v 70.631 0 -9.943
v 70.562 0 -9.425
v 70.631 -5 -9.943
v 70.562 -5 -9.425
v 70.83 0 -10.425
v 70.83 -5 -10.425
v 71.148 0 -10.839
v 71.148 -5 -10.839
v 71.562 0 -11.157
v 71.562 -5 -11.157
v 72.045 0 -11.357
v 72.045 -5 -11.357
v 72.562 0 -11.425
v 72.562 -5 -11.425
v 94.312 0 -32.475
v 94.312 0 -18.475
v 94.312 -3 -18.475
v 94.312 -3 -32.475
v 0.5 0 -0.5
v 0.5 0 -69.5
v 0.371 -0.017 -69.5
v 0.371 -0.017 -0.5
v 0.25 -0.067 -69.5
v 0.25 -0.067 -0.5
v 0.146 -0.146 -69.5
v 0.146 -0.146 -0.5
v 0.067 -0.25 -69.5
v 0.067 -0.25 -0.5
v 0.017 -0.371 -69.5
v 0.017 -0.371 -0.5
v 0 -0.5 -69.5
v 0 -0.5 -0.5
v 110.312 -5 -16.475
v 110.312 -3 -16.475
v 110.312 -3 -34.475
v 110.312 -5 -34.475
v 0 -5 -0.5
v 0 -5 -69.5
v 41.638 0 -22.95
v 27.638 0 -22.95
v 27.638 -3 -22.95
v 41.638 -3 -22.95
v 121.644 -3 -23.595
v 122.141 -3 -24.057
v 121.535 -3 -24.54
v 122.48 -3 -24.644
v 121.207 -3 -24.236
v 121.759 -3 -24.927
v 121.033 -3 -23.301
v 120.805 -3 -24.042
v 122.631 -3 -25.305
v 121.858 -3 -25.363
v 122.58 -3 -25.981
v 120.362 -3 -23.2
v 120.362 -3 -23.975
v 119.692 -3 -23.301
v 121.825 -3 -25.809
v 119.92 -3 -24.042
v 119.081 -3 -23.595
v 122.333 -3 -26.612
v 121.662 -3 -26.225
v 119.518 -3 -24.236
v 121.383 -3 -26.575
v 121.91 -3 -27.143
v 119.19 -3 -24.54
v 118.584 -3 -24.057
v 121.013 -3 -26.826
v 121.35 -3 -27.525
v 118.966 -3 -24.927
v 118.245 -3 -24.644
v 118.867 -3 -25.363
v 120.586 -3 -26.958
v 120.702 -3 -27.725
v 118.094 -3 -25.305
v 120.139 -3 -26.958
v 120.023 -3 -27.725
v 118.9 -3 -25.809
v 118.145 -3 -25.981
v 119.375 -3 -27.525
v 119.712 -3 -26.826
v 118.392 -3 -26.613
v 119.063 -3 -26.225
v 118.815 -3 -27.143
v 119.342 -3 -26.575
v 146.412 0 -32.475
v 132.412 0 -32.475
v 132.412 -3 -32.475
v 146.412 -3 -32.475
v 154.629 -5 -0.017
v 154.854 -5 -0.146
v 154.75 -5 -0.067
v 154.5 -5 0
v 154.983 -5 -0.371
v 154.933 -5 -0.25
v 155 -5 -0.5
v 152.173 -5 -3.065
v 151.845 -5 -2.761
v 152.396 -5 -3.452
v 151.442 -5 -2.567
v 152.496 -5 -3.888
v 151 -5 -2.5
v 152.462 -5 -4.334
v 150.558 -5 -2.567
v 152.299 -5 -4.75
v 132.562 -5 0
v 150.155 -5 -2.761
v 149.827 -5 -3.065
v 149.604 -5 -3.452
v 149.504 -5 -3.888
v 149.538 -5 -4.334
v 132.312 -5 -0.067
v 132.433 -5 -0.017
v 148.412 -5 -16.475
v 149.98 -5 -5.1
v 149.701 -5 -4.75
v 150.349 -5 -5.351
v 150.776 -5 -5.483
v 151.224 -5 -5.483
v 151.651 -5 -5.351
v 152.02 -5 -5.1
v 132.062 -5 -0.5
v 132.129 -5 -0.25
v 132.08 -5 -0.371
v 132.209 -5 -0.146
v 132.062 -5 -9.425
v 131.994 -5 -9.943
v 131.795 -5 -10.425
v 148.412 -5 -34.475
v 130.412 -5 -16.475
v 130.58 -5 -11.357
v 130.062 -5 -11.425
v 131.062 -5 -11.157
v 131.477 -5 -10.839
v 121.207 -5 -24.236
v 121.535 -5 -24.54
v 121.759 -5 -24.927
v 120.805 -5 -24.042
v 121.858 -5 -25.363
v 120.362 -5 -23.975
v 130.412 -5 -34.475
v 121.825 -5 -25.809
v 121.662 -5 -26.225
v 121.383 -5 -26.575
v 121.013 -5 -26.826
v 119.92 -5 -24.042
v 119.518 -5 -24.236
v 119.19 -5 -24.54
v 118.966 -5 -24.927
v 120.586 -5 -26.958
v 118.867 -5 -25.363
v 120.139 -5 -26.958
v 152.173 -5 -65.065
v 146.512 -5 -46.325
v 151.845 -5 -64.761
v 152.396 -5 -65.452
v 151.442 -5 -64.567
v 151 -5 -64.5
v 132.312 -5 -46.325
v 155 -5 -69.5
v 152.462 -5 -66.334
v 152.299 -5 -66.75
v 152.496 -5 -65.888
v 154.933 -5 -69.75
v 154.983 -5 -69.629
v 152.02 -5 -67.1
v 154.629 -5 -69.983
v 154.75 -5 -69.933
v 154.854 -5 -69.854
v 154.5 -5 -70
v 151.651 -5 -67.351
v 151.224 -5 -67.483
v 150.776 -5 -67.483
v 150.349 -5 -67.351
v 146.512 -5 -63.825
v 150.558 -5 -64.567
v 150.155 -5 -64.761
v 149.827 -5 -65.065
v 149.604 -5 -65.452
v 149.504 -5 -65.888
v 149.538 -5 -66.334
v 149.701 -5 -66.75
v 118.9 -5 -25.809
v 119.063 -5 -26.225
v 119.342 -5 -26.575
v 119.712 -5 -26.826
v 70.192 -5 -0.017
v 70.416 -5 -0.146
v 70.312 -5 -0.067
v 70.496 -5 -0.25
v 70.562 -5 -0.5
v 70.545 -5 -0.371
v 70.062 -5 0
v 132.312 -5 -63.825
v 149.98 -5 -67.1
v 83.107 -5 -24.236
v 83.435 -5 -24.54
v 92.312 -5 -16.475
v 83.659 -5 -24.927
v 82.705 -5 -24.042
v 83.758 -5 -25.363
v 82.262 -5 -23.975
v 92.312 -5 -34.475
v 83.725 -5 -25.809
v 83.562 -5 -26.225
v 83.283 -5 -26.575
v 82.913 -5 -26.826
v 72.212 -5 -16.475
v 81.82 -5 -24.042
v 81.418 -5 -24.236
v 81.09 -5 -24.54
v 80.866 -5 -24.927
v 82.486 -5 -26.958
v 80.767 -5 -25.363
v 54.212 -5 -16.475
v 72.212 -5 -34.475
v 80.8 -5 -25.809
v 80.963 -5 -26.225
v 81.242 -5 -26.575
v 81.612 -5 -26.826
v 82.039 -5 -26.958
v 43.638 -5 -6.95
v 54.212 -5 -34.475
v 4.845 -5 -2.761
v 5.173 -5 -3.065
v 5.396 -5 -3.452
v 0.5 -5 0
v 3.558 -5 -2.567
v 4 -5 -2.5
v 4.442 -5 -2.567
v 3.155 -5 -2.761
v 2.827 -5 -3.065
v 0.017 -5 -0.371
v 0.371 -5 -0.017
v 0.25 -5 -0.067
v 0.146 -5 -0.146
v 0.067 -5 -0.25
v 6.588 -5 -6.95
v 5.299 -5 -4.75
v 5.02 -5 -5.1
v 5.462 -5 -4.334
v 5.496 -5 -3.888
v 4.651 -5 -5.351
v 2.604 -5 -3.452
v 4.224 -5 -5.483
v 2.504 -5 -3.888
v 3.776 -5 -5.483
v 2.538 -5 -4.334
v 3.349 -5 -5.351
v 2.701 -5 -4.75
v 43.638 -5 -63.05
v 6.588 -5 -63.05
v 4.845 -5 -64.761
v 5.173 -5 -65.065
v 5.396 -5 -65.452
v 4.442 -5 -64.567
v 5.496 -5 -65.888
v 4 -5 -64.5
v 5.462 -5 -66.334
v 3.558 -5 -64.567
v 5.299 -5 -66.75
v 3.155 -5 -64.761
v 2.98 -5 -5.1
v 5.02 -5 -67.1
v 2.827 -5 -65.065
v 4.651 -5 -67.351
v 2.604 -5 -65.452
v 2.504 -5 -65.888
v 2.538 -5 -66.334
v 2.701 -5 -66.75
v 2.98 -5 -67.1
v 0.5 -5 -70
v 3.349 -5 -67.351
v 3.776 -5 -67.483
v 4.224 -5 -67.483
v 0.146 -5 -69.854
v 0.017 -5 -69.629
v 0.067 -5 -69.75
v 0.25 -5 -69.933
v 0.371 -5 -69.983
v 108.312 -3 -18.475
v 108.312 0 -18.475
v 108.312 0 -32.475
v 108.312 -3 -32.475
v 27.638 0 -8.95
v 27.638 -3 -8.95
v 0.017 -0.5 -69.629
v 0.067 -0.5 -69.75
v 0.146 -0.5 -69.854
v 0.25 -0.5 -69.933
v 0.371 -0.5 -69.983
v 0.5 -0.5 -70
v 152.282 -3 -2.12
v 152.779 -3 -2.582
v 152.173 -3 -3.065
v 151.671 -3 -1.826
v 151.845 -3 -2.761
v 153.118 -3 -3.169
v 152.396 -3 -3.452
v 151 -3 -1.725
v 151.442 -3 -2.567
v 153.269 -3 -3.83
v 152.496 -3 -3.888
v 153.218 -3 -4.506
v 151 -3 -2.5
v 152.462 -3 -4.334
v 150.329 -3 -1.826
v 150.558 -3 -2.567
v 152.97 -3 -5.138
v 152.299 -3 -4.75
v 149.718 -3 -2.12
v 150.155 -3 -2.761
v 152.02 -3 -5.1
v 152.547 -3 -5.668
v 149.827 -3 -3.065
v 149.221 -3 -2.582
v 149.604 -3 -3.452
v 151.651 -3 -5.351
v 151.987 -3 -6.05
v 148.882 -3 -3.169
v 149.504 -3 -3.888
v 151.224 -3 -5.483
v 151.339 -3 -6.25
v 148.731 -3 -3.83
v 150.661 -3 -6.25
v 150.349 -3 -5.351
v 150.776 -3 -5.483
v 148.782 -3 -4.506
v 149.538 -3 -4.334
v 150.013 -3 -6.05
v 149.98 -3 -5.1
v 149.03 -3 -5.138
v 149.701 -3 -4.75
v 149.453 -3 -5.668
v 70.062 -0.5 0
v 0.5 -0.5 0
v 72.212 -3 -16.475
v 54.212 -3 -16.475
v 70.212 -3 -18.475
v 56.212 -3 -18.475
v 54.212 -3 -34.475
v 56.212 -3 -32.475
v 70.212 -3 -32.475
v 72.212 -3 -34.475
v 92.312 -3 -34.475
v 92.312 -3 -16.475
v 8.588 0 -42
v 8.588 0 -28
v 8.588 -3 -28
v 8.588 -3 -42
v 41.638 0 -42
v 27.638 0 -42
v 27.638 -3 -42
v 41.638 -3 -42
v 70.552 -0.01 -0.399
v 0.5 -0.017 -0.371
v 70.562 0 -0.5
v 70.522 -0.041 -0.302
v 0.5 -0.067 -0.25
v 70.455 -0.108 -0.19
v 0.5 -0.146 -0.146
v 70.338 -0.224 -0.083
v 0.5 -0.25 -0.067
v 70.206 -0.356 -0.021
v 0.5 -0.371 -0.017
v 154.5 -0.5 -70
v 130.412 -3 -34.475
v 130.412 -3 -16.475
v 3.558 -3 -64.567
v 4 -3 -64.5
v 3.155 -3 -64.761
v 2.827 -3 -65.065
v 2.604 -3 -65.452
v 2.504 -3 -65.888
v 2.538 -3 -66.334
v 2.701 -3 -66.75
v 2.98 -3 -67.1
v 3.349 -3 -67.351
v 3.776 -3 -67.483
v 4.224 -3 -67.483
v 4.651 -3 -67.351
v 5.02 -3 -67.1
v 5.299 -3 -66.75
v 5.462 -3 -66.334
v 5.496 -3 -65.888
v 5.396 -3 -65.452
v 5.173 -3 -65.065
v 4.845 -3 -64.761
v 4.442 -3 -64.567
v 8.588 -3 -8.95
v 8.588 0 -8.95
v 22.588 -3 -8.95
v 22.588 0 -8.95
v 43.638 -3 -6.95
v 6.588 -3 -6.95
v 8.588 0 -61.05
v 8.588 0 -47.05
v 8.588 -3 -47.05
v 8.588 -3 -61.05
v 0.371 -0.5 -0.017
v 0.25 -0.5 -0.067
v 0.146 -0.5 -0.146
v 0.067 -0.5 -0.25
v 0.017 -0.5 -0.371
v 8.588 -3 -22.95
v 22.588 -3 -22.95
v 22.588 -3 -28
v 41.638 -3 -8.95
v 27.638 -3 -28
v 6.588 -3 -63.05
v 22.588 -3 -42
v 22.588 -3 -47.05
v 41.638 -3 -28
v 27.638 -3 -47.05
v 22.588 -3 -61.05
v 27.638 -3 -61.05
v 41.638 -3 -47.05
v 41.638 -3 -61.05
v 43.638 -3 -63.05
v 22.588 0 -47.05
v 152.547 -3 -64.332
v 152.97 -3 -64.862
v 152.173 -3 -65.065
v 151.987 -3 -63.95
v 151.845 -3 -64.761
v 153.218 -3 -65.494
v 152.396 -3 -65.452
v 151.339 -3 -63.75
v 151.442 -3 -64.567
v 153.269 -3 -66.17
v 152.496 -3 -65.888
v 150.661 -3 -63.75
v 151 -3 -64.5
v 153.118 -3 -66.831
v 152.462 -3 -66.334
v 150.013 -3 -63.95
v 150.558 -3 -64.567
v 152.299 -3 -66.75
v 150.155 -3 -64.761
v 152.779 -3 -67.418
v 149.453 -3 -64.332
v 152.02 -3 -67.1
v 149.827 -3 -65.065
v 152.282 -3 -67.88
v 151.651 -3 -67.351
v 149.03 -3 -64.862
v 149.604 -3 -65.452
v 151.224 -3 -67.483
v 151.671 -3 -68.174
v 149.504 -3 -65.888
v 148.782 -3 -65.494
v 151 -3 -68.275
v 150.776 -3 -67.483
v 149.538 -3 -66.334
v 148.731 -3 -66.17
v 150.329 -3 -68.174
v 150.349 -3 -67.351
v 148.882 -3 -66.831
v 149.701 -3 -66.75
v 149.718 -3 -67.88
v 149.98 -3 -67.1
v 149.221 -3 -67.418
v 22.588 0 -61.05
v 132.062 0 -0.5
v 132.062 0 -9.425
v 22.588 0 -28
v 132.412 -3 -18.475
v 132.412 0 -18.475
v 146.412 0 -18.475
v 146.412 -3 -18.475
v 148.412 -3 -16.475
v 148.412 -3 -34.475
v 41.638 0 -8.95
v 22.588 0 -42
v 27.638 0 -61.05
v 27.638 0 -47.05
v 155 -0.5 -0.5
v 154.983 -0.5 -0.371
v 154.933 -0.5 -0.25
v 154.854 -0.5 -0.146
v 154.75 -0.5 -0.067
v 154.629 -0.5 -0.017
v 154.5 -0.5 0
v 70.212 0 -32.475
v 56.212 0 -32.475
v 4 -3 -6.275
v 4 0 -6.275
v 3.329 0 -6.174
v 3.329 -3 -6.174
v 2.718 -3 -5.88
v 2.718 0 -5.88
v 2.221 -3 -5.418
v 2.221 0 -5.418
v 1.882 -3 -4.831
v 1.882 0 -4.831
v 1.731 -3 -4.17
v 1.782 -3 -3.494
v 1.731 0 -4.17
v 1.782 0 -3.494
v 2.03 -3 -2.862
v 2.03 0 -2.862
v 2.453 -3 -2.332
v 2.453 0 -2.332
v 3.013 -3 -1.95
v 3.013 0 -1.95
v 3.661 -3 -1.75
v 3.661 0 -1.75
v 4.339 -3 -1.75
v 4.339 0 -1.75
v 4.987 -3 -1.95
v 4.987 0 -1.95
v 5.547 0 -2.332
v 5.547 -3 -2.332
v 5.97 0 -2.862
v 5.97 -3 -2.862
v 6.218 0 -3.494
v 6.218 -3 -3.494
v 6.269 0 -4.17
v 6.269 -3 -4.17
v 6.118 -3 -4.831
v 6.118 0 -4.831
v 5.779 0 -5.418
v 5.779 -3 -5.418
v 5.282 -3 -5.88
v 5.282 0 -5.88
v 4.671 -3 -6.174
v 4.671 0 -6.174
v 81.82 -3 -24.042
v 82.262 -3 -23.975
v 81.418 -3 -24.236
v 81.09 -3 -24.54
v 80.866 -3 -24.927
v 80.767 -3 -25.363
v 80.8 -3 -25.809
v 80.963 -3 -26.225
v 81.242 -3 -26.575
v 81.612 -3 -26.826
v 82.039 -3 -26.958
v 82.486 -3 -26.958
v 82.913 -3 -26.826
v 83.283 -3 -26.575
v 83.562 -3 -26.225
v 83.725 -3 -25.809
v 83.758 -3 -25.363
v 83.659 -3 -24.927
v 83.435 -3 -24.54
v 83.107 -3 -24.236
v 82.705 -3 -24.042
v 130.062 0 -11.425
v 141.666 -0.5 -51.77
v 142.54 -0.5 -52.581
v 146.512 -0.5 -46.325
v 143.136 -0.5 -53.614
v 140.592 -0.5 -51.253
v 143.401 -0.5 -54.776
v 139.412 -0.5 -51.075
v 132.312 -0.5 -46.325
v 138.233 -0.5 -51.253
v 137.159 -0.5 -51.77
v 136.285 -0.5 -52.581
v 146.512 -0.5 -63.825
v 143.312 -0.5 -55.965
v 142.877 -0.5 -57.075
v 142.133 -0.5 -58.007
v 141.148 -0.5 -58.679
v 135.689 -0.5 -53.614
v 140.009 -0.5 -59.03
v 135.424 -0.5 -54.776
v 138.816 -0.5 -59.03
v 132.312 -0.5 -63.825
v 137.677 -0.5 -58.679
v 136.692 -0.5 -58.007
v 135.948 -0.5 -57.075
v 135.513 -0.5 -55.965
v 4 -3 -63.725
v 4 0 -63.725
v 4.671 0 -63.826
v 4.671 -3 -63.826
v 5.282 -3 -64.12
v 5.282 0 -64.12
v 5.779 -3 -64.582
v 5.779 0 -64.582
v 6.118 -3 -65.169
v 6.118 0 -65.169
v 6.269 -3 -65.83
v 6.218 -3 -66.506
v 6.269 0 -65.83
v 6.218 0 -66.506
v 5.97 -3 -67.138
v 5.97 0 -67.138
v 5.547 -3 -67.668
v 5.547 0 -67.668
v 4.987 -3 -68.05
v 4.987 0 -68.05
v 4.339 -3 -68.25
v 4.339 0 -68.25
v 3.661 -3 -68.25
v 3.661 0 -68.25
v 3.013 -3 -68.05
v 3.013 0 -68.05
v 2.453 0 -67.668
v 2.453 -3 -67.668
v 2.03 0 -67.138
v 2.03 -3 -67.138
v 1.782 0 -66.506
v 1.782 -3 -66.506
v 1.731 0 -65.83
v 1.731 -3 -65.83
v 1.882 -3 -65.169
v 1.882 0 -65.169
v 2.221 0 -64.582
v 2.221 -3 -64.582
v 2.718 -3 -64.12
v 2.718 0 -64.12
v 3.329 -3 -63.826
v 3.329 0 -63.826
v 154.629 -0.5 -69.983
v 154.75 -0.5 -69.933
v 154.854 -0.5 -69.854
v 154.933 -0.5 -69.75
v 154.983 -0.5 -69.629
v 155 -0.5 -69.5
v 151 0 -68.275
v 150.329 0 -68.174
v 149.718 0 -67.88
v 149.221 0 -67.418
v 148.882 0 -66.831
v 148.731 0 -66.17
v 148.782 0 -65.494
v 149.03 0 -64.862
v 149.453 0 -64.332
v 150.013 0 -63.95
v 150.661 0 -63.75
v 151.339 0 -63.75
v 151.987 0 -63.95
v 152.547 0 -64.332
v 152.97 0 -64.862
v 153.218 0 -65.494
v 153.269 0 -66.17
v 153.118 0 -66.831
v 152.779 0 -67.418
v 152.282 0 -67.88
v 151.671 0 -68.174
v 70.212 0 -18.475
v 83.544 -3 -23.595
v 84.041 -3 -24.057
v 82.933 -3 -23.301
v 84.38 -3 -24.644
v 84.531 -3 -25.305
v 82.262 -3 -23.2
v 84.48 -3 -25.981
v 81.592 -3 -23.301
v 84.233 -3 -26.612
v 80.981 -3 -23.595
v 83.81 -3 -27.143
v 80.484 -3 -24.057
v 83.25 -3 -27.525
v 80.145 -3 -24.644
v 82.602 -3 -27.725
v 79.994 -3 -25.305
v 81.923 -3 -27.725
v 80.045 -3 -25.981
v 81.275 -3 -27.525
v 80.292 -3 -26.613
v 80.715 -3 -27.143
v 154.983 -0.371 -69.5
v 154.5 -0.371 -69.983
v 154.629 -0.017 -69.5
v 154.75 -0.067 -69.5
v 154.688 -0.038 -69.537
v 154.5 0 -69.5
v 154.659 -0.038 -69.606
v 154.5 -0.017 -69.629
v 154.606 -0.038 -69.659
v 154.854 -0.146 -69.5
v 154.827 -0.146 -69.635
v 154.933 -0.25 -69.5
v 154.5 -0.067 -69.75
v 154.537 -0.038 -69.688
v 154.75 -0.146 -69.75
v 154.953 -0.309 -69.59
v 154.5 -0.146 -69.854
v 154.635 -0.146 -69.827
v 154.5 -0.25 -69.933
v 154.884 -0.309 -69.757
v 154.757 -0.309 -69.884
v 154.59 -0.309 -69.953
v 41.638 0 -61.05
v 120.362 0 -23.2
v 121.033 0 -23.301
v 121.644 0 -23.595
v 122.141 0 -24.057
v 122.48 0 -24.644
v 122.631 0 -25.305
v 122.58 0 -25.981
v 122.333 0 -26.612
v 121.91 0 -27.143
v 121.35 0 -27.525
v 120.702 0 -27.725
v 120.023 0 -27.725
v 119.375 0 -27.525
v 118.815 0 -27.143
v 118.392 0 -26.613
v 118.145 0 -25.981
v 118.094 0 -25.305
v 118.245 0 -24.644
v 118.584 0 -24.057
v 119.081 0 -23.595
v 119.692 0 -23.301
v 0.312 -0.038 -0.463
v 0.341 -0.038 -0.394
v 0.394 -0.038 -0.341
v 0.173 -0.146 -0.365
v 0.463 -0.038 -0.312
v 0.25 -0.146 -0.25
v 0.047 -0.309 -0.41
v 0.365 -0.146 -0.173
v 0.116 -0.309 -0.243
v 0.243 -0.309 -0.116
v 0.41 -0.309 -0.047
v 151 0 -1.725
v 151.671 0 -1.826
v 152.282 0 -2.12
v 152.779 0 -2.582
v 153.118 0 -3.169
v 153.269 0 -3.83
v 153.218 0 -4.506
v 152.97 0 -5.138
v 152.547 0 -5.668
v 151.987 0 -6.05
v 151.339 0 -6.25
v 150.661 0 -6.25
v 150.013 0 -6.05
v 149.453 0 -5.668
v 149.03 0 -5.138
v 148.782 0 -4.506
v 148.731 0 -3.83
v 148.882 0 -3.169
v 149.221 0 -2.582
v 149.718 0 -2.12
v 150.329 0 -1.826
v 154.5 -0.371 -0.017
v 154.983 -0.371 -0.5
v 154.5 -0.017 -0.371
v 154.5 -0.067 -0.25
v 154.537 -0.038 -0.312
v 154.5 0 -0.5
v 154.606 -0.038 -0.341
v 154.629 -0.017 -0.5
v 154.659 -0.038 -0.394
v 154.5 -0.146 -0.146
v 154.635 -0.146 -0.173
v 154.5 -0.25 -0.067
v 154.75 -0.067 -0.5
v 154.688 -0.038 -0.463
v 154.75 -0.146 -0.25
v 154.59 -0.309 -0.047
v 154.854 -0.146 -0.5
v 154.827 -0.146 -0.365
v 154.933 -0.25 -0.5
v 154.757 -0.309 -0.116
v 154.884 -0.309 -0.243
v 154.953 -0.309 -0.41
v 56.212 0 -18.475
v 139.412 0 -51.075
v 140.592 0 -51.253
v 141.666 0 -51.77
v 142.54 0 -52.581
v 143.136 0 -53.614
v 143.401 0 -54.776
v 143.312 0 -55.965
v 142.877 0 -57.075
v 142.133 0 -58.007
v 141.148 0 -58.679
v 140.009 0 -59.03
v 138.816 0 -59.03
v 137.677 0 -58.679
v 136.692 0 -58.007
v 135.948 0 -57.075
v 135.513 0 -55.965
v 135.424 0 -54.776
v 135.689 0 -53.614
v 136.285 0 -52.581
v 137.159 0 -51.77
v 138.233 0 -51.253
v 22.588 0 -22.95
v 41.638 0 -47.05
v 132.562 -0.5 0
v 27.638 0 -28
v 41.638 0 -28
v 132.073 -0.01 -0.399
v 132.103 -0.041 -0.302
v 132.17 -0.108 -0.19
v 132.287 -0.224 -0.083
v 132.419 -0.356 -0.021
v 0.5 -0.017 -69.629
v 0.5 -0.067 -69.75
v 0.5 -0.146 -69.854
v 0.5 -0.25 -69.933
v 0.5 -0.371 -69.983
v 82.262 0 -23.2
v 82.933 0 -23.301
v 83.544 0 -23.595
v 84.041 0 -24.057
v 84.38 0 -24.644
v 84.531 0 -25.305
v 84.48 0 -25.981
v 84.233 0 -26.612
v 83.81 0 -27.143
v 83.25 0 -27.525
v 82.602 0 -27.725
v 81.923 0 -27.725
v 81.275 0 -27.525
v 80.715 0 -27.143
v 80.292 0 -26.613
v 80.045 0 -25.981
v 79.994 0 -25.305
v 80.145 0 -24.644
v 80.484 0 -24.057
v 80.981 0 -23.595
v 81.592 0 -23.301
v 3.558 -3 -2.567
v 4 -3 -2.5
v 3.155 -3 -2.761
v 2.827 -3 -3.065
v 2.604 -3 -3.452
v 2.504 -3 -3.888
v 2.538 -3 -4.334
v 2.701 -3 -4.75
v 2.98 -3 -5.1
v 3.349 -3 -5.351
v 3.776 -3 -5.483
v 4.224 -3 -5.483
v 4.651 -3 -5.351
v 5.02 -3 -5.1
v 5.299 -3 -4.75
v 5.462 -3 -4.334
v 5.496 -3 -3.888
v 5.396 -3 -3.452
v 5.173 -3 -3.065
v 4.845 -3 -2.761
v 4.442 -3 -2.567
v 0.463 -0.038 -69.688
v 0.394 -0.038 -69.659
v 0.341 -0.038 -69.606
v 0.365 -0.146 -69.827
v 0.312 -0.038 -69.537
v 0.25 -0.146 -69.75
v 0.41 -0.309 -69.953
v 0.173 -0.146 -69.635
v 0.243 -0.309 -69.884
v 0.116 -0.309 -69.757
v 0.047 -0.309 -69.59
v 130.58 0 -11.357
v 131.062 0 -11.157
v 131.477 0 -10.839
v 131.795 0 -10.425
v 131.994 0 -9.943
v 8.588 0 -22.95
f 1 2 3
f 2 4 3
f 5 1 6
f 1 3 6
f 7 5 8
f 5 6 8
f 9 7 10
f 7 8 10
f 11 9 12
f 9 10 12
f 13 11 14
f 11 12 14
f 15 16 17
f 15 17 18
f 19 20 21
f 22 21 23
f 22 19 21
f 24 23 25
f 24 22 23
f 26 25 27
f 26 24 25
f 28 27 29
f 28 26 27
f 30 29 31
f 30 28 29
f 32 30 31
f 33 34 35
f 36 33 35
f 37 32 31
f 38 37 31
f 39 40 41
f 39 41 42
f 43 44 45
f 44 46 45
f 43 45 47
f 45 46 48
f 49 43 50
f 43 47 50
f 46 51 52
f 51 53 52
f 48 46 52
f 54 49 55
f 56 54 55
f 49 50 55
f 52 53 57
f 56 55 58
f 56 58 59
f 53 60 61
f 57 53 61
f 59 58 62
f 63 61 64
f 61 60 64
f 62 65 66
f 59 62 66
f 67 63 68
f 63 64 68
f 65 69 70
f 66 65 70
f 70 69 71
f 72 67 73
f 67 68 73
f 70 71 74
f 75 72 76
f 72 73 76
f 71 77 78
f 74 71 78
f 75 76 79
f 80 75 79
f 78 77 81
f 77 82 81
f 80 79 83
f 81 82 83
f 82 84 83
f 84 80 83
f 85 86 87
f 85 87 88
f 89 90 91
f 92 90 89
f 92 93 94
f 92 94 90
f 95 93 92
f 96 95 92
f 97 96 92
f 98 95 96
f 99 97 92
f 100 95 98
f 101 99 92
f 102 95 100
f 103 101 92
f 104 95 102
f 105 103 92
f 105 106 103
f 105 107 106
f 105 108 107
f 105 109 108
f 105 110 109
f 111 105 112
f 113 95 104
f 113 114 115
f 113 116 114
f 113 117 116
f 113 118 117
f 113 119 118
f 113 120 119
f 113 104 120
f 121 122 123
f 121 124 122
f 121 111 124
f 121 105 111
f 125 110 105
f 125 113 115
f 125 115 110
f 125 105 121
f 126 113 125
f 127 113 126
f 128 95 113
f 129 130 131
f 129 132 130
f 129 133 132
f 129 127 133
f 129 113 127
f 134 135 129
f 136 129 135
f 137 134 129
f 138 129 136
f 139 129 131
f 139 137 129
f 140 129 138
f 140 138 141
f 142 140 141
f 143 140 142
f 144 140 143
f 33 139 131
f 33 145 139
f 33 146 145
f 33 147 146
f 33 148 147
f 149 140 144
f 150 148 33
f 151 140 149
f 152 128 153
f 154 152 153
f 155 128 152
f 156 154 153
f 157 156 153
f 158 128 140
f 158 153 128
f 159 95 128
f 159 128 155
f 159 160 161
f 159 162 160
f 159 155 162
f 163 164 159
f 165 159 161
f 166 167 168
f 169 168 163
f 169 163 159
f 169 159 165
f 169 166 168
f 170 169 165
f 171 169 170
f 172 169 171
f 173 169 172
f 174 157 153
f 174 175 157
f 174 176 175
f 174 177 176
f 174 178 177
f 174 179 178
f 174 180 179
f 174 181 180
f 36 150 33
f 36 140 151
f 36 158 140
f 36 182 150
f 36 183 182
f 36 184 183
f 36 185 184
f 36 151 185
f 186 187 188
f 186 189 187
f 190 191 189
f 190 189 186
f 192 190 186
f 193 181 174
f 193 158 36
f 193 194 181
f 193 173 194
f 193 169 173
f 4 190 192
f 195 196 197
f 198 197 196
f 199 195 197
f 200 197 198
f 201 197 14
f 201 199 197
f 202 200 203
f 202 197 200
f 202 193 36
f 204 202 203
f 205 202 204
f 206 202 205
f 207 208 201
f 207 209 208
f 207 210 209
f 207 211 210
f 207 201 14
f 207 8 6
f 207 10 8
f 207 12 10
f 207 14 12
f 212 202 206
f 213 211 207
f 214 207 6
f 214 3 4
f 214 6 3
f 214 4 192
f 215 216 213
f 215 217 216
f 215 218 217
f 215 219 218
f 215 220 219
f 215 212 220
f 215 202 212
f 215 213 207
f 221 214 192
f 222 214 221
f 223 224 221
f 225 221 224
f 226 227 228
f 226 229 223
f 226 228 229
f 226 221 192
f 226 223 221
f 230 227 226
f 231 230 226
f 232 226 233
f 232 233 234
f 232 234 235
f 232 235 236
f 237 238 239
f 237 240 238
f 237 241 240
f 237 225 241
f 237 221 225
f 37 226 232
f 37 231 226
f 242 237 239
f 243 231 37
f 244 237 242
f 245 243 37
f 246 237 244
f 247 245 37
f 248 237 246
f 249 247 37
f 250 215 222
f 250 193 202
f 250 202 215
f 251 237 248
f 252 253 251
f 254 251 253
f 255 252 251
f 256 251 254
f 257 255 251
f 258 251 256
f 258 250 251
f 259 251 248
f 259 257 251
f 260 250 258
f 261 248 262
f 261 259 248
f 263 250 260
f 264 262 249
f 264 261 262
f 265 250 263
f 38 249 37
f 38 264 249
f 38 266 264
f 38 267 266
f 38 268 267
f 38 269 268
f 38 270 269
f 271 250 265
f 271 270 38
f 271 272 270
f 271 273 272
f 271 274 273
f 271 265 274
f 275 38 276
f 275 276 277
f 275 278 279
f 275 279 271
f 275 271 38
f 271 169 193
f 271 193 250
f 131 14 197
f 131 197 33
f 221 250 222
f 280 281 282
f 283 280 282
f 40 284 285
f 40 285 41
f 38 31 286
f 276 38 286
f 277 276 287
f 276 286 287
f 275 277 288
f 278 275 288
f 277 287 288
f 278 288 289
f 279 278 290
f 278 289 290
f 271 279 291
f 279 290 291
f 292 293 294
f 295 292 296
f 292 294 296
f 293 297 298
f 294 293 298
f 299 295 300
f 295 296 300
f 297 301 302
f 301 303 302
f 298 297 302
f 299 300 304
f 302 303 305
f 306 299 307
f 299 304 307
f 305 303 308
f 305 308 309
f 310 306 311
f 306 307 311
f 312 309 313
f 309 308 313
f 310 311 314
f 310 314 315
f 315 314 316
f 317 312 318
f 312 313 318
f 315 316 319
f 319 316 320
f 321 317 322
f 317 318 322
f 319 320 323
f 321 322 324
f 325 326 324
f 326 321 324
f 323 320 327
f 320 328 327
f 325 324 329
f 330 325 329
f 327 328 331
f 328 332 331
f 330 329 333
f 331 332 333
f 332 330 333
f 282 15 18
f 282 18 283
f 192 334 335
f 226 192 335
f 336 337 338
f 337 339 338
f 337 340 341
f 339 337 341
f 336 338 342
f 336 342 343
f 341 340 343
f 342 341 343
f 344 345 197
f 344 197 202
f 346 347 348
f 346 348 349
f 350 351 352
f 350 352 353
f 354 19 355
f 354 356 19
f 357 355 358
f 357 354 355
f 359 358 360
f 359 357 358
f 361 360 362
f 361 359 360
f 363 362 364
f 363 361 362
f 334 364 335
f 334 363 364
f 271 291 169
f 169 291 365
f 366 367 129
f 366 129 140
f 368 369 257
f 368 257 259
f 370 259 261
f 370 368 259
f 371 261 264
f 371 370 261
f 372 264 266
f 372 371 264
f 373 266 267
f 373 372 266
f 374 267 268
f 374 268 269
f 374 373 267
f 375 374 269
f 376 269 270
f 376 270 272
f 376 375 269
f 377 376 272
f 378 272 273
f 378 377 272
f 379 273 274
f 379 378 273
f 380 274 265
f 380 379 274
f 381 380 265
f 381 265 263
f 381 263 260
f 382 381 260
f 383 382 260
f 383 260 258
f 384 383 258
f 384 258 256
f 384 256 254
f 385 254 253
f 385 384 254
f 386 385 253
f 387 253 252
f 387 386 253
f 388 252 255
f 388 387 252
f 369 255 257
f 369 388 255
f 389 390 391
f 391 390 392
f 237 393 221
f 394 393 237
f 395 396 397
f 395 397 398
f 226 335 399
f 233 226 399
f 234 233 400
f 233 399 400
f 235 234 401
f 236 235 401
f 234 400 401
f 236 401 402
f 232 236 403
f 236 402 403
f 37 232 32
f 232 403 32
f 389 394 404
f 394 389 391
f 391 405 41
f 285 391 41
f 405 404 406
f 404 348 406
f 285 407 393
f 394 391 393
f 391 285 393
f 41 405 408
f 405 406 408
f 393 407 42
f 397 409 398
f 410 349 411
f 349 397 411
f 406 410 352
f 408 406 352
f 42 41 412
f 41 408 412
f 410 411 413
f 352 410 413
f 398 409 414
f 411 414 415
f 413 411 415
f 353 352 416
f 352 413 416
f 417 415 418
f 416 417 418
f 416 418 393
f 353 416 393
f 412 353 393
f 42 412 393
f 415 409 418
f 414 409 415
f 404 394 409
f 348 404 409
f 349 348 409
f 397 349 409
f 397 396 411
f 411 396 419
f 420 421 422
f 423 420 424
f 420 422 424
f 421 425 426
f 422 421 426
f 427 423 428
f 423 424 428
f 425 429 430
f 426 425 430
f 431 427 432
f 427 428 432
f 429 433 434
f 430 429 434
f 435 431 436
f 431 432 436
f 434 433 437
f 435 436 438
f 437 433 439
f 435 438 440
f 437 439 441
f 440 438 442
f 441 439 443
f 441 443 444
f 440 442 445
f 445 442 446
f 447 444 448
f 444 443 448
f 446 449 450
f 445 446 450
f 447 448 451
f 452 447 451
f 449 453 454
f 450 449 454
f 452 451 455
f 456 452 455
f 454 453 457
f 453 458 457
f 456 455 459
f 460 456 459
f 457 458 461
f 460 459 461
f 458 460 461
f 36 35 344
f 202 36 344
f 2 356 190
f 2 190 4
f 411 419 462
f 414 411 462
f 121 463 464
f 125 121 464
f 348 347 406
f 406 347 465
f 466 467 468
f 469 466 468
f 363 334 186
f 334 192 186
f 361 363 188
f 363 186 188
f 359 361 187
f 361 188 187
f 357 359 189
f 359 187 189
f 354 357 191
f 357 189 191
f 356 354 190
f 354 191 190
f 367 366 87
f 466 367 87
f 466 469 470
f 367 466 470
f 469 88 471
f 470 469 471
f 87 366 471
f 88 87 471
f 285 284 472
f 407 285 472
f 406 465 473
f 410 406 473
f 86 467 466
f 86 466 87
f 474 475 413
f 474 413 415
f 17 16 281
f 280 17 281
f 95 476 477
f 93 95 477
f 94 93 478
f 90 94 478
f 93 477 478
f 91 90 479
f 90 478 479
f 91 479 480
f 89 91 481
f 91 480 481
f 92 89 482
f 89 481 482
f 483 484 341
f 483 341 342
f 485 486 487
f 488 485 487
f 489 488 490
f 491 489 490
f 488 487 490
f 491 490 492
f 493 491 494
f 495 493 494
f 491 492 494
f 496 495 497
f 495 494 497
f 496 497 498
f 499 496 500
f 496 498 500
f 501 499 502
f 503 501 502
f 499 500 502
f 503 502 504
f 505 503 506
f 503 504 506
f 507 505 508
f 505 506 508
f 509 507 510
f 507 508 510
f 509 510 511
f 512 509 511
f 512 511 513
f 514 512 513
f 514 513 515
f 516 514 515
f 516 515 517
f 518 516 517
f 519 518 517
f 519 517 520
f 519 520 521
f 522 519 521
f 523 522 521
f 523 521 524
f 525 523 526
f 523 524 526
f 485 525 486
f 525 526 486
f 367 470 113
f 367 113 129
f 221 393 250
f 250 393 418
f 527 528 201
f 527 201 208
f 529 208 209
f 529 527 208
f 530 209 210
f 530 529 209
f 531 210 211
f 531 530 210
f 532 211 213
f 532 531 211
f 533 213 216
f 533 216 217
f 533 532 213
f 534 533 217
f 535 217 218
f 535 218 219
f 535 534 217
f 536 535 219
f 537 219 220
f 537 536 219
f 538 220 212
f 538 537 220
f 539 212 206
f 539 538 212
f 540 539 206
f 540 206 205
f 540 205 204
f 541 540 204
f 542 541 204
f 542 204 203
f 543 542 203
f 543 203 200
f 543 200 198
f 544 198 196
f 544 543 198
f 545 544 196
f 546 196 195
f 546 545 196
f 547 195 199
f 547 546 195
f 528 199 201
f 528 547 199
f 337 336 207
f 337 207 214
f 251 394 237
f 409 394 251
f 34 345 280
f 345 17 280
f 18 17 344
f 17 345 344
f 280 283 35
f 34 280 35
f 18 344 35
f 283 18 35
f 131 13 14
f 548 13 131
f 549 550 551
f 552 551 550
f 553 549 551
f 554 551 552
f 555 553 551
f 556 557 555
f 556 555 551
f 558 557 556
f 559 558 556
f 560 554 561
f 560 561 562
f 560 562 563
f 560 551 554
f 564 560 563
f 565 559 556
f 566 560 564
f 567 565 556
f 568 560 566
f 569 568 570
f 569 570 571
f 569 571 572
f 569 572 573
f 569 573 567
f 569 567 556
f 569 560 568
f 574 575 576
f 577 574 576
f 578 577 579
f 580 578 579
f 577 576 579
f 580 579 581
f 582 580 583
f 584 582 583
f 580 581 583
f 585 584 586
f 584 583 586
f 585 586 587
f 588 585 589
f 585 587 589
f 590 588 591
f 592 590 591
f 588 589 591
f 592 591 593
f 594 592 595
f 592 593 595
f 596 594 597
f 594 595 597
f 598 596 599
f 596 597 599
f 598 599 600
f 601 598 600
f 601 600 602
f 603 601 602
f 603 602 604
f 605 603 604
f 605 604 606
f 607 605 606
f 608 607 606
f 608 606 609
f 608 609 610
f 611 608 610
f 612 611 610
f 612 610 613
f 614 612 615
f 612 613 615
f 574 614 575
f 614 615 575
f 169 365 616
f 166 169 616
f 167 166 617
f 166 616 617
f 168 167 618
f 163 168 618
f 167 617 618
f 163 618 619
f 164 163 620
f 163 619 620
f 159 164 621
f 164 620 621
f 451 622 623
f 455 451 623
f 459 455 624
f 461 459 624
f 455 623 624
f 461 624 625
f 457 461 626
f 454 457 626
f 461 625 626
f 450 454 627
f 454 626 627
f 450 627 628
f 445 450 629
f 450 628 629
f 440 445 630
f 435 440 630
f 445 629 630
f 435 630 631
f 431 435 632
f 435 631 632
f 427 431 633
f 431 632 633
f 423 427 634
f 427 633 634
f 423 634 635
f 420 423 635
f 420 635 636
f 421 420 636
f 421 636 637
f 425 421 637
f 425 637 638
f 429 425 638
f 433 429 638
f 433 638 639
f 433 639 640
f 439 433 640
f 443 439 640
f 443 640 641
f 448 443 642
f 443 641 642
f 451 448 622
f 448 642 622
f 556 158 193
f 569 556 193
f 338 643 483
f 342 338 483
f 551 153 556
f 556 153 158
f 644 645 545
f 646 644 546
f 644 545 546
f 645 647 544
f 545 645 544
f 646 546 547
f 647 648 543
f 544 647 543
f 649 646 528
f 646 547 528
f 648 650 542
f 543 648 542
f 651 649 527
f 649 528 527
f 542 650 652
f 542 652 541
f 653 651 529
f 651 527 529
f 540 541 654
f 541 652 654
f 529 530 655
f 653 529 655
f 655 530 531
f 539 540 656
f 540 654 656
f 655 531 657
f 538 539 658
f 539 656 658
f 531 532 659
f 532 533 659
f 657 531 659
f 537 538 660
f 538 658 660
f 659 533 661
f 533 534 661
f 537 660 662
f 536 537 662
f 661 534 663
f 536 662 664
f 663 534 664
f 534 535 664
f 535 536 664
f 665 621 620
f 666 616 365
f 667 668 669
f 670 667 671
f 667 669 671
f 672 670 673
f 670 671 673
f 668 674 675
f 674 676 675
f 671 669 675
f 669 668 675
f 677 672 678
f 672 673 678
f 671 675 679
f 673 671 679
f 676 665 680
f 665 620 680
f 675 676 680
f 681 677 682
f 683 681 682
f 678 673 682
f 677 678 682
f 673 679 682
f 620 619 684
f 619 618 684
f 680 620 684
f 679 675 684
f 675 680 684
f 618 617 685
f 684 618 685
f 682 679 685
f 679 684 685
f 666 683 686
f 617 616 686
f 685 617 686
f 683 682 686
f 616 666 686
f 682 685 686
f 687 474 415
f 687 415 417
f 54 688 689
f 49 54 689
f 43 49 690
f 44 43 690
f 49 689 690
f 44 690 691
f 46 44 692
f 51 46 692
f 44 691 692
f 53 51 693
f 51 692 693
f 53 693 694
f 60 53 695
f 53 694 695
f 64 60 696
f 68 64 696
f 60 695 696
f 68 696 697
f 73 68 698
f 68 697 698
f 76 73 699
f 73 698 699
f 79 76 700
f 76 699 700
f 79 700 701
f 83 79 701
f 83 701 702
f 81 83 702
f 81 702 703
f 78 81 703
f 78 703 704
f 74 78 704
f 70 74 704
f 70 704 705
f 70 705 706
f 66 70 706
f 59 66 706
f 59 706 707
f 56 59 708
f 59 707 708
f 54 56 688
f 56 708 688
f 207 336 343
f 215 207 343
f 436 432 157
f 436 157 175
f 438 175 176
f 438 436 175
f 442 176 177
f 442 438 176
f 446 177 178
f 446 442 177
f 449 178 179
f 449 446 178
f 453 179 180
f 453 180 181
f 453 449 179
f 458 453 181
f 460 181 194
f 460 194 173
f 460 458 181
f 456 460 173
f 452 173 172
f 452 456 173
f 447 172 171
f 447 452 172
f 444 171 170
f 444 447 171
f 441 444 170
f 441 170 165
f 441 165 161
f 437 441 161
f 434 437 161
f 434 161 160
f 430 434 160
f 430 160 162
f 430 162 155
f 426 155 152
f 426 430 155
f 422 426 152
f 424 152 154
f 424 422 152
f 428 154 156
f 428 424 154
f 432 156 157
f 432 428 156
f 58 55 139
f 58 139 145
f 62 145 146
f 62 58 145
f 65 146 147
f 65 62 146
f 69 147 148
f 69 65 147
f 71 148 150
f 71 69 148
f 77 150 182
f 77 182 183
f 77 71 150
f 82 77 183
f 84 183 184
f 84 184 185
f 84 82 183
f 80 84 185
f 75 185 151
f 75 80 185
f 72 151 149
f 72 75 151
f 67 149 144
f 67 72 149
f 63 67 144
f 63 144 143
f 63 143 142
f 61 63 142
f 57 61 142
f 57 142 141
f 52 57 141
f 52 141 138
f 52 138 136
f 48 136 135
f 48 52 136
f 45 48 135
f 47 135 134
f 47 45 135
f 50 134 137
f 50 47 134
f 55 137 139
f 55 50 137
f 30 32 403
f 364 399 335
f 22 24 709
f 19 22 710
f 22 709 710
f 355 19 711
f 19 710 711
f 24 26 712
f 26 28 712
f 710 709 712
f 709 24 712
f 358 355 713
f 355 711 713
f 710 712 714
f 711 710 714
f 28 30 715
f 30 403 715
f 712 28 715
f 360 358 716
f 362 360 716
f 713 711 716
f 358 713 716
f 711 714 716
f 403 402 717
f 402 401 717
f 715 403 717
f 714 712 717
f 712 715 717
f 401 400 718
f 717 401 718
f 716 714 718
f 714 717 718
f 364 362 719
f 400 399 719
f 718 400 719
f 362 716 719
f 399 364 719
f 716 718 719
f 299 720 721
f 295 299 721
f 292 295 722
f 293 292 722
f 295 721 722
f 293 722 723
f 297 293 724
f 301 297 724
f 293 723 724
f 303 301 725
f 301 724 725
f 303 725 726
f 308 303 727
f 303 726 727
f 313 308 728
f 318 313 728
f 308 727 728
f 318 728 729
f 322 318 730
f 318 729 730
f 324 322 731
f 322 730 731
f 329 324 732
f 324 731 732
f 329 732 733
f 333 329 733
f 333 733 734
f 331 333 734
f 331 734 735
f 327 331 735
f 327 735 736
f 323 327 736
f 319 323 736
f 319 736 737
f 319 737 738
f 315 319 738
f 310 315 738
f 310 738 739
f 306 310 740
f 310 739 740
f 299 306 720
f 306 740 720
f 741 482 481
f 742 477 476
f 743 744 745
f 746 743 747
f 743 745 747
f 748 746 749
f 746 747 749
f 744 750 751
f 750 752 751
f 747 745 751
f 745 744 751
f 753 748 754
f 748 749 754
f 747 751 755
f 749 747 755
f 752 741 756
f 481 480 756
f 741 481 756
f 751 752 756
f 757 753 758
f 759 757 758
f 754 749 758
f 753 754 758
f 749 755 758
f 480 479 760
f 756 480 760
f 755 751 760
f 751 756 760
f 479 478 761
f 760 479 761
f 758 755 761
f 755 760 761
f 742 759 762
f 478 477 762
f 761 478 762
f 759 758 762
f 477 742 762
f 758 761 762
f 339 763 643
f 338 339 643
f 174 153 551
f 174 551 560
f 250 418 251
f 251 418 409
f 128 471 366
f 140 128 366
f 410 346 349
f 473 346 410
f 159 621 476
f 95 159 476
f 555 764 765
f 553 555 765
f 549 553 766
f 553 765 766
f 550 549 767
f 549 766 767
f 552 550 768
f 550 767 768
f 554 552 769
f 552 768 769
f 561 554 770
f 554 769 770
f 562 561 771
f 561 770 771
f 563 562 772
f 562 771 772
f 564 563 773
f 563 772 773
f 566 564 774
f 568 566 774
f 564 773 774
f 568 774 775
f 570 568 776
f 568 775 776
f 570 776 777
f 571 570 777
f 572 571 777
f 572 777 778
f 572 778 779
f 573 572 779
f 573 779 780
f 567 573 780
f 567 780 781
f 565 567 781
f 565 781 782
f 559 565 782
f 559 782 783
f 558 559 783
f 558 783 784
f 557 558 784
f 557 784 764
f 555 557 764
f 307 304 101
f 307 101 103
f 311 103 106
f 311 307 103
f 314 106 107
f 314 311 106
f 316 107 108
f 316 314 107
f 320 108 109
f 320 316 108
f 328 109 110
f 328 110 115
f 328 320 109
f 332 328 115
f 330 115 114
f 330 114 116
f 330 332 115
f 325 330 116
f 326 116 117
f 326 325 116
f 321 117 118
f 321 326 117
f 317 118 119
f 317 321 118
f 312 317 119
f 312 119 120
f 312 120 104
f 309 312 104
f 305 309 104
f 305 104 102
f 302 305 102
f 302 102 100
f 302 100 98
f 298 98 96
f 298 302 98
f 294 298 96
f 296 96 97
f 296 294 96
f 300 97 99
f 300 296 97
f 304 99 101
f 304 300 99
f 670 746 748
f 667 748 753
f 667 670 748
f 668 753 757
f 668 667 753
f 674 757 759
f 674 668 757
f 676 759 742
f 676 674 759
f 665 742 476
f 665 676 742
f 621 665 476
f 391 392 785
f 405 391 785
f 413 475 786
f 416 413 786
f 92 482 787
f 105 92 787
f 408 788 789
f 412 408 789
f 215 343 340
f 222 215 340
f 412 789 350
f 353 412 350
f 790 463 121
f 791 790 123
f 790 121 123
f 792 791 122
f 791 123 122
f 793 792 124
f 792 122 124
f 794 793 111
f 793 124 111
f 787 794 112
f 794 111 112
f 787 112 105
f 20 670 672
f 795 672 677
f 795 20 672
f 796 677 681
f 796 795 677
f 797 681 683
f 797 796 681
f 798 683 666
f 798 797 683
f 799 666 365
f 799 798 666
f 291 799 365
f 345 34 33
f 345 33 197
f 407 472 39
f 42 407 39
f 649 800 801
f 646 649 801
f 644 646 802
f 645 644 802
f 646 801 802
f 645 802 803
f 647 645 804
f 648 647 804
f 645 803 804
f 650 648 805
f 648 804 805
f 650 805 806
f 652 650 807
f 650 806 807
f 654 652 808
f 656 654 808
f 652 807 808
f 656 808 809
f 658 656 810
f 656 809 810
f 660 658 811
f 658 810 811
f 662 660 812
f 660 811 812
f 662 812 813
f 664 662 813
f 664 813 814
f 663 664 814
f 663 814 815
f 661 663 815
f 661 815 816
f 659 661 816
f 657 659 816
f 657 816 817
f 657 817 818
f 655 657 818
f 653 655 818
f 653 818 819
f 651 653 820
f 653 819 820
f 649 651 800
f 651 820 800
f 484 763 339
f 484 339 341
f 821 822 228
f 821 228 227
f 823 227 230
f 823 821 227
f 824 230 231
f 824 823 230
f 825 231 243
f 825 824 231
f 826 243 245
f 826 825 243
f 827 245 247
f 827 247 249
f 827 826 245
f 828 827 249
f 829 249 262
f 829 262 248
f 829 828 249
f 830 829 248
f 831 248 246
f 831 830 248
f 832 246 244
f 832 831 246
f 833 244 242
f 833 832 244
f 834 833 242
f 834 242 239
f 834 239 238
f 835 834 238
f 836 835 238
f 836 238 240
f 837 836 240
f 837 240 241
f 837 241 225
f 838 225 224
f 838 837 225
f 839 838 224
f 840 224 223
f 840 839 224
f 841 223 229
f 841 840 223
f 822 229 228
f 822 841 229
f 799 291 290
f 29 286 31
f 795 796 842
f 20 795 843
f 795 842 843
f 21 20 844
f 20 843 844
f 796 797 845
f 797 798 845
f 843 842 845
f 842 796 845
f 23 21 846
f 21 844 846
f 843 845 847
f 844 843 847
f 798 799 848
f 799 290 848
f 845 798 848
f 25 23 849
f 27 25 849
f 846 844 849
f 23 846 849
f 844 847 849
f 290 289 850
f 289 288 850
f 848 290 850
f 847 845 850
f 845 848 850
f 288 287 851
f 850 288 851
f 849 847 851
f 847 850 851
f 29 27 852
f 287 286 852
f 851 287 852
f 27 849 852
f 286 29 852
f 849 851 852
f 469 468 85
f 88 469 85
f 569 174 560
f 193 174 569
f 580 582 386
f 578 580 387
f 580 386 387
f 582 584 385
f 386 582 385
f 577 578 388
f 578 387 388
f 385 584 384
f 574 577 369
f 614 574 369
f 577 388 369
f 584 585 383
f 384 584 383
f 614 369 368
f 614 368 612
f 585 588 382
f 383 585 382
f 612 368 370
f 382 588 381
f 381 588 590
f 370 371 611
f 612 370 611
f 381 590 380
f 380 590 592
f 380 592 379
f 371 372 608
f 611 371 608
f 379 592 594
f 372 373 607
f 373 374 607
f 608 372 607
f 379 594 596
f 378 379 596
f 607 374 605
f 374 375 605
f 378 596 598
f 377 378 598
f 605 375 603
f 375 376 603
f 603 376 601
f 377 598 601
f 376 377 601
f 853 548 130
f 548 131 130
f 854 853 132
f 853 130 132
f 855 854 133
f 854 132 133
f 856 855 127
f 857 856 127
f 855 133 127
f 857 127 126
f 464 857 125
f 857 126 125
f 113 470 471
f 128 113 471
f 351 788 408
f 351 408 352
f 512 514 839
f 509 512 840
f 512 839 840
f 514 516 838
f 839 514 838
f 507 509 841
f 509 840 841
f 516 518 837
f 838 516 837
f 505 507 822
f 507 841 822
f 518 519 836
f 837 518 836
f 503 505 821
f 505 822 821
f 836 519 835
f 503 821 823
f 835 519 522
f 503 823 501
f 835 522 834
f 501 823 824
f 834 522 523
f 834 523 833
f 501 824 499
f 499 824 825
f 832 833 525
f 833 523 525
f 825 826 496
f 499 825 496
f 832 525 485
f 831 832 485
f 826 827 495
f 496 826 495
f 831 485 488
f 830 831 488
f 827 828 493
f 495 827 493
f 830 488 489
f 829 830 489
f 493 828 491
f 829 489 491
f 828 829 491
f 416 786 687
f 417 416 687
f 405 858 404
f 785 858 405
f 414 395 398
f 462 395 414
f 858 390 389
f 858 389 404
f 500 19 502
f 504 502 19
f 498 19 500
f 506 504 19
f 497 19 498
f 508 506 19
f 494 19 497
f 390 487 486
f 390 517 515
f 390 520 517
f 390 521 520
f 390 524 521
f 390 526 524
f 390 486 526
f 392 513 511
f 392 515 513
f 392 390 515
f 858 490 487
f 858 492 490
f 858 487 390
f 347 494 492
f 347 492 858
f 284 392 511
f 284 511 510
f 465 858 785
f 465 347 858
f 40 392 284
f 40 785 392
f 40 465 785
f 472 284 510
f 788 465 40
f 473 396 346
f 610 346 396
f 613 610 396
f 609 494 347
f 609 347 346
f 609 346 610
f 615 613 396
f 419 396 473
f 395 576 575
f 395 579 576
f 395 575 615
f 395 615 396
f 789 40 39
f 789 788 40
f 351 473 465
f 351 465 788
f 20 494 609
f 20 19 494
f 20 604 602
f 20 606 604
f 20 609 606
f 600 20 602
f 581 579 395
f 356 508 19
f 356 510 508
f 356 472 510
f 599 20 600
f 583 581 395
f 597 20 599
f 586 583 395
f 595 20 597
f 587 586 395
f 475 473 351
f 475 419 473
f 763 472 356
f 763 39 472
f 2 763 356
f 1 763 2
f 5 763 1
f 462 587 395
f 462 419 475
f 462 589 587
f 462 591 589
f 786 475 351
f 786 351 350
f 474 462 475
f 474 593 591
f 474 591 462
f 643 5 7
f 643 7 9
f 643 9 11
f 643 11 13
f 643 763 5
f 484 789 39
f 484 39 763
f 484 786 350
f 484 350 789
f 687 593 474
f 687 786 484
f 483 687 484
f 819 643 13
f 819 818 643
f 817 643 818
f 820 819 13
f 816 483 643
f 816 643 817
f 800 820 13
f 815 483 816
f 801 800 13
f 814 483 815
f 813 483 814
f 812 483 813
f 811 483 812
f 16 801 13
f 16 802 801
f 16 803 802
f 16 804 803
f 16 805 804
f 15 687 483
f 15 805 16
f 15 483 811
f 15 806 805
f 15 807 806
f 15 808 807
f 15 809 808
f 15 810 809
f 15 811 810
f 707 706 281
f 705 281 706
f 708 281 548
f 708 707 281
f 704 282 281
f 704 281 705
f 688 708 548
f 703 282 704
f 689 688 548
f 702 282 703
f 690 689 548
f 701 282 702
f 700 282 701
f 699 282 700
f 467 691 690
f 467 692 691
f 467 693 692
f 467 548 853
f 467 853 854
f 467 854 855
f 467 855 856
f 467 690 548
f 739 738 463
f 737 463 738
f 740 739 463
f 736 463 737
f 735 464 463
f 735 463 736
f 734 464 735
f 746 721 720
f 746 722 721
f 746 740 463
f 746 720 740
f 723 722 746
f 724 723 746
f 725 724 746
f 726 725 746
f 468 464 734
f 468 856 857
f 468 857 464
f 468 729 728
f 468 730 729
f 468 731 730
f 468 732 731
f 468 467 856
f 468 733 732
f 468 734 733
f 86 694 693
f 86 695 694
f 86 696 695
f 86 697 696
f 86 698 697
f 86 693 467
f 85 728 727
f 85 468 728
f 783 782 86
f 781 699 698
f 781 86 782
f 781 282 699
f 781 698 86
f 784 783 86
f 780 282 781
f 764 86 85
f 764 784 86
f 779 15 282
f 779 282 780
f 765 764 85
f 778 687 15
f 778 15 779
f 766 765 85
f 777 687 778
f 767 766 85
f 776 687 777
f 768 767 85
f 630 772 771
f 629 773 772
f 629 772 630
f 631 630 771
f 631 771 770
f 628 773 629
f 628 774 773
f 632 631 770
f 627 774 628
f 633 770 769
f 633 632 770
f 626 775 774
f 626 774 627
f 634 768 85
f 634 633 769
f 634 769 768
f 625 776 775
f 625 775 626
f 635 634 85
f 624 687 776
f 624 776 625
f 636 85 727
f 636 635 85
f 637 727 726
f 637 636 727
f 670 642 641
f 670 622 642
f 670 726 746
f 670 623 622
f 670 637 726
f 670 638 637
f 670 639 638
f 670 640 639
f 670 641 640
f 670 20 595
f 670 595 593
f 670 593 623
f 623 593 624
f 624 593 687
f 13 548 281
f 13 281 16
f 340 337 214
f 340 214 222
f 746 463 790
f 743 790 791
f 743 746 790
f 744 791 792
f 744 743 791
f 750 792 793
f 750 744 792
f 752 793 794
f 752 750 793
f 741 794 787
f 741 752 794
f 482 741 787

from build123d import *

# Parameters (mm, degrees)
SKETCH1_R           = 2.275
SKETCH1_R_2         = 4
SKETCH1_W           = 14
SKETCH1_H           = 14
BOSS_EXTRUDE1_DEPTH = 3
SKETCH2_R           = 1.5
SKETCH2_R_2         = 4
SKETCH2_W           = 37.05
SKETCH2_H           = 56.1
SKETCH2_W_2         = 18
SKETCH2_H_2         = 18
BOSS_EXTRUDE2_DEPTH = 2
SKETCH3_W           = 14.2
SKETCH3_H           = 17.5
CUT_EXTRUDE1_DEPTH  = 4.5
SKETCH4_W           = 61.5
SKETCH4_H           = 11.425
CUT_EXTRUDE2_DEPTH  = 171.146995272
FILLET1_R           = 0.5
FILLET2_R           = 2


with BuildPart() as part:
    # Sketch1 → Boss-Extrude1 (new body)
    with BuildSketch(Plane(origin=(0, 0, 0), x_dir=(1, 0, 0), z_dir=(0, 1, 0))):
        with BuildLine():
            Line((0.5, 0), (154.5, 0))
            ThreePointArc((154.5, 0), (154.853553391, 0.146446609), (155, 0.5))
            Line((155, 0.5), (155, 69.5))
            ThreePointArc((155, 69.5), (154.853553391, 69.853553391), (154.5, 70))
            Line((154.5, 70), (0.5, 70))
            ThreePointArc((0.5, 70), (0.146446609, 69.853553391), (0, 69.5))
            Line((0, 69.5), (0, 0.5))
            ThreePointArc((0, 0.5), (0.146446609, 0.146446609), (0.5, 0))
        make_face()
        with Locations(Location((4, 66, 0), (0, 0, 270))):
            Circle(SKETCH1_R, mode=Mode.SUBTRACT)
        with Locations(Location((4, 4, 0), (0, 0, 90))):
            Circle(SKETCH1_R, mode=Mode.SUBTRACT)
        with Locations(Location((151, 4, 0), (0, 0, 270))):
            Circle(SKETCH1_R, mode=Mode.SUBTRACT)
        with Locations(Location((151, 66, 0), (0, 0, 90))):
            Circle(SKETCH1_R, mode=Mode.SUBTRACT)
        with Locations(Location((82.2625, 25.475, 0), (0, 0, 270))):
            Circle(SKETCH1_R, mode=Mode.SUBTRACT)
        with Locations(Location((120.3625, 25.475, 0), (0, 0, 270))):
            Circle(SKETCH1_R, mode=Mode.SUBTRACT)
        with Locations(Location((139.4125, 55.075, 0), (0, 0, 270))):
            Circle(SKETCH1_R_2, mode=Mode.SUBTRACT)
        with Locations((15.5875, 54.05)):
            Rectangle(SKETCH1_W, SKETCH1_H, mode=Mode.SUBTRACT)
        with Locations((34.6375, 54.05)):
            Rectangle(SKETCH1_W, SKETCH1_H, mode=Mode.SUBTRACT)
        with Locations((34.6375, 35)):
            Rectangle(SKETCH1_W, SKETCH1_H, mode=Mode.SUBTRACT)
        with Locations((34.6375, 15.95)):
            Rectangle(SKETCH1_W, SKETCH1_H, mode=Mode.SUBTRACT)
        with Locations((15.5875, 35)):
            Rectangle(SKETCH1_W, SKETCH1_H, mode=Mode.SUBTRACT)
        with Locations((15.5875, 15.95)):
            Rectangle(SKETCH1_W, SKETCH1_H, mode=Mode.SUBTRACT)
        with Locations((101.3125, 25.475)):
            Rectangle(SKETCH1_W, SKETCH1_H, mode=Mode.SUBTRACT)
        with Locations((63.2125, 25.475)):
            Rectangle(SKETCH1_W, SKETCH1_H, mode=Mode.SUBTRACT)
        with Locations((139.4125, 25.475)):
            Rectangle(SKETCH1_W, SKETCH1_H, mode=Mode.SUBTRACT)
    extrude(amount=-BOSS_EXTRUDE1_DEPTH)

    # Sketch2 → Boss-Extrude2 (add)
    with BuildSketch(Plane(origin=(0, -3, 0), x_dir=(-1, 0, 0), z_dir=(0, -1, 0))):
        with BuildLine():
            Line((-0.5, 70), (-154.5, 70))
            ThreePointArc((-154.5, 70), (-154.853553391, 69.853553391), (-155, 69.5))
            Line((-155, 69.5), (-155, 0.5))
            ThreePointArc((-155, 0.5), (-154.853553391, 0.146446609), (-154.5, 0))
            Line((-154.5, 0), (-0.5, 0))
            ThreePointArc((-0.5, 0), (-0.146446609, 0.146446609), (0, 0.5))
            Line((0, 0.5), (0, 69.5))
            ThreePointArc((0, 69.5), (-0.146446609, 69.853553391), (-0.5, 70))
        make_face()
        with Locations(Location((-4, 66, 0), (0, 0, 270))):
            Circle(SKETCH2_R, mode=Mode.SUBTRACT)
        with Locations(Location((-4, 4, 0), (0, 0, 270))):
            Circle(SKETCH2_R, mode=Mode.SUBTRACT)
        with Locations(Location((-151, 4, 0), (0, 0, 270))):
            Circle(SKETCH2_R, mode=Mode.SUBTRACT)
        with Locations(Location((-151, 66, 0), (0, 0, 270))):
            Circle(SKETCH2_R, mode=Mode.SUBTRACT)
        with Locations(Location((-82.2625, 25.475, 0), (0, 0, 270))):
            Circle(SKETCH2_R, mode=Mode.SUBTRACT)
        with Locations(Location((-120.3625, 25.475, 0), (0, 0, 270))):
            Circle(SKETCH2_R, mode=Mode.SUBTRACT)
        with Locations(Location((-139.4125, 55.075, 0), (0, 0, 270))):
            Circle(SKETCH2_R_2, mode=Mode.SUBTRACT)
        with Locations((-25.1125, 35)):
            Rectangle(SKETCH2_W, SKETCH2_H, mode=Mode.SUBTRACT)
        with Locations((-63.2125, 25.475)):
            Rectangle(SKETCH2_W_2, SKETCH2_H_2, mode=Mode.SUBTRACT)
        with Locations((-101.3125, 25.475)):
            Rectangle(SKETCH2_W_2, SKETCH2_H_2, mode=Mode.SUBTRACT)
        with Locations((-139.4125, 25.475)):
            Rectangle(SKETCH2_W_2, SKETCH2_H_2, mode=Mode.SUBTRACT)
    extrude(amount=BOSS_EXTRUDE2_DEPTH)

    # Sketch3 → Cut-Extrude1 (cut)
    with BuildSketch(Plane(origin=(0, -5, 0), x_dir=(-1, 0, 0), z_dir=(0, -1, 0))):
        with Locations((-139.4125, 55.075)):
            Rectangle(SKETCH3_W, SKETCH3_H)
    extrude(amount=-CUT_EXTRUDE1_DEPTH, mode=Mode.SUBTRACT)

    # Sketch4 → Cut-Extrude2 (cut, through all)
    with BuildSketch(Plane(origin=(0, 0, 0), x_dir=(1, 0, 0), z_dir=(0, 1, 0))):
        with Locations((101.3125, 5.7125)):
            Rectangle(SKETCH4_W, SKETCH4_H)
    extrude(amount=-CUT_EXTRUDE2_DEPTH, mode=Mode.SUBTRACT)

    # Fillet1
    fillet1_edges = [part.edges().sort_by_distance(p)[0] for p in [
        (0, 0, -35),
        (0.146446609, 0, -69.853553391),
        (77.5, 0, -70),
        (154.853553391, 0, -69.853553391),
        (143.28125, 0, 0),
        (132.0625, -2.5, 0),
        (70.5625, -2.5, 0),
        (155, 0, -35),
        (154.853553391, 0, -0.146446609),
        (35.53125, 0, 0),
        (0.146446609, 0, -0.146446609),
    ]]
    fillet(fillet1_edges, radius=FILLET1_R)

    # Fillet2
    fillet2_edges = [part.edges().sort_by_distance(p)[0] for p in [
        (70.5625, -2.5, -11.425),
        (132.0625, -2.5, -11.425),
    ]]
    fillet(fillet2_edges, radius=FILLET2_R)


solid = part.part
